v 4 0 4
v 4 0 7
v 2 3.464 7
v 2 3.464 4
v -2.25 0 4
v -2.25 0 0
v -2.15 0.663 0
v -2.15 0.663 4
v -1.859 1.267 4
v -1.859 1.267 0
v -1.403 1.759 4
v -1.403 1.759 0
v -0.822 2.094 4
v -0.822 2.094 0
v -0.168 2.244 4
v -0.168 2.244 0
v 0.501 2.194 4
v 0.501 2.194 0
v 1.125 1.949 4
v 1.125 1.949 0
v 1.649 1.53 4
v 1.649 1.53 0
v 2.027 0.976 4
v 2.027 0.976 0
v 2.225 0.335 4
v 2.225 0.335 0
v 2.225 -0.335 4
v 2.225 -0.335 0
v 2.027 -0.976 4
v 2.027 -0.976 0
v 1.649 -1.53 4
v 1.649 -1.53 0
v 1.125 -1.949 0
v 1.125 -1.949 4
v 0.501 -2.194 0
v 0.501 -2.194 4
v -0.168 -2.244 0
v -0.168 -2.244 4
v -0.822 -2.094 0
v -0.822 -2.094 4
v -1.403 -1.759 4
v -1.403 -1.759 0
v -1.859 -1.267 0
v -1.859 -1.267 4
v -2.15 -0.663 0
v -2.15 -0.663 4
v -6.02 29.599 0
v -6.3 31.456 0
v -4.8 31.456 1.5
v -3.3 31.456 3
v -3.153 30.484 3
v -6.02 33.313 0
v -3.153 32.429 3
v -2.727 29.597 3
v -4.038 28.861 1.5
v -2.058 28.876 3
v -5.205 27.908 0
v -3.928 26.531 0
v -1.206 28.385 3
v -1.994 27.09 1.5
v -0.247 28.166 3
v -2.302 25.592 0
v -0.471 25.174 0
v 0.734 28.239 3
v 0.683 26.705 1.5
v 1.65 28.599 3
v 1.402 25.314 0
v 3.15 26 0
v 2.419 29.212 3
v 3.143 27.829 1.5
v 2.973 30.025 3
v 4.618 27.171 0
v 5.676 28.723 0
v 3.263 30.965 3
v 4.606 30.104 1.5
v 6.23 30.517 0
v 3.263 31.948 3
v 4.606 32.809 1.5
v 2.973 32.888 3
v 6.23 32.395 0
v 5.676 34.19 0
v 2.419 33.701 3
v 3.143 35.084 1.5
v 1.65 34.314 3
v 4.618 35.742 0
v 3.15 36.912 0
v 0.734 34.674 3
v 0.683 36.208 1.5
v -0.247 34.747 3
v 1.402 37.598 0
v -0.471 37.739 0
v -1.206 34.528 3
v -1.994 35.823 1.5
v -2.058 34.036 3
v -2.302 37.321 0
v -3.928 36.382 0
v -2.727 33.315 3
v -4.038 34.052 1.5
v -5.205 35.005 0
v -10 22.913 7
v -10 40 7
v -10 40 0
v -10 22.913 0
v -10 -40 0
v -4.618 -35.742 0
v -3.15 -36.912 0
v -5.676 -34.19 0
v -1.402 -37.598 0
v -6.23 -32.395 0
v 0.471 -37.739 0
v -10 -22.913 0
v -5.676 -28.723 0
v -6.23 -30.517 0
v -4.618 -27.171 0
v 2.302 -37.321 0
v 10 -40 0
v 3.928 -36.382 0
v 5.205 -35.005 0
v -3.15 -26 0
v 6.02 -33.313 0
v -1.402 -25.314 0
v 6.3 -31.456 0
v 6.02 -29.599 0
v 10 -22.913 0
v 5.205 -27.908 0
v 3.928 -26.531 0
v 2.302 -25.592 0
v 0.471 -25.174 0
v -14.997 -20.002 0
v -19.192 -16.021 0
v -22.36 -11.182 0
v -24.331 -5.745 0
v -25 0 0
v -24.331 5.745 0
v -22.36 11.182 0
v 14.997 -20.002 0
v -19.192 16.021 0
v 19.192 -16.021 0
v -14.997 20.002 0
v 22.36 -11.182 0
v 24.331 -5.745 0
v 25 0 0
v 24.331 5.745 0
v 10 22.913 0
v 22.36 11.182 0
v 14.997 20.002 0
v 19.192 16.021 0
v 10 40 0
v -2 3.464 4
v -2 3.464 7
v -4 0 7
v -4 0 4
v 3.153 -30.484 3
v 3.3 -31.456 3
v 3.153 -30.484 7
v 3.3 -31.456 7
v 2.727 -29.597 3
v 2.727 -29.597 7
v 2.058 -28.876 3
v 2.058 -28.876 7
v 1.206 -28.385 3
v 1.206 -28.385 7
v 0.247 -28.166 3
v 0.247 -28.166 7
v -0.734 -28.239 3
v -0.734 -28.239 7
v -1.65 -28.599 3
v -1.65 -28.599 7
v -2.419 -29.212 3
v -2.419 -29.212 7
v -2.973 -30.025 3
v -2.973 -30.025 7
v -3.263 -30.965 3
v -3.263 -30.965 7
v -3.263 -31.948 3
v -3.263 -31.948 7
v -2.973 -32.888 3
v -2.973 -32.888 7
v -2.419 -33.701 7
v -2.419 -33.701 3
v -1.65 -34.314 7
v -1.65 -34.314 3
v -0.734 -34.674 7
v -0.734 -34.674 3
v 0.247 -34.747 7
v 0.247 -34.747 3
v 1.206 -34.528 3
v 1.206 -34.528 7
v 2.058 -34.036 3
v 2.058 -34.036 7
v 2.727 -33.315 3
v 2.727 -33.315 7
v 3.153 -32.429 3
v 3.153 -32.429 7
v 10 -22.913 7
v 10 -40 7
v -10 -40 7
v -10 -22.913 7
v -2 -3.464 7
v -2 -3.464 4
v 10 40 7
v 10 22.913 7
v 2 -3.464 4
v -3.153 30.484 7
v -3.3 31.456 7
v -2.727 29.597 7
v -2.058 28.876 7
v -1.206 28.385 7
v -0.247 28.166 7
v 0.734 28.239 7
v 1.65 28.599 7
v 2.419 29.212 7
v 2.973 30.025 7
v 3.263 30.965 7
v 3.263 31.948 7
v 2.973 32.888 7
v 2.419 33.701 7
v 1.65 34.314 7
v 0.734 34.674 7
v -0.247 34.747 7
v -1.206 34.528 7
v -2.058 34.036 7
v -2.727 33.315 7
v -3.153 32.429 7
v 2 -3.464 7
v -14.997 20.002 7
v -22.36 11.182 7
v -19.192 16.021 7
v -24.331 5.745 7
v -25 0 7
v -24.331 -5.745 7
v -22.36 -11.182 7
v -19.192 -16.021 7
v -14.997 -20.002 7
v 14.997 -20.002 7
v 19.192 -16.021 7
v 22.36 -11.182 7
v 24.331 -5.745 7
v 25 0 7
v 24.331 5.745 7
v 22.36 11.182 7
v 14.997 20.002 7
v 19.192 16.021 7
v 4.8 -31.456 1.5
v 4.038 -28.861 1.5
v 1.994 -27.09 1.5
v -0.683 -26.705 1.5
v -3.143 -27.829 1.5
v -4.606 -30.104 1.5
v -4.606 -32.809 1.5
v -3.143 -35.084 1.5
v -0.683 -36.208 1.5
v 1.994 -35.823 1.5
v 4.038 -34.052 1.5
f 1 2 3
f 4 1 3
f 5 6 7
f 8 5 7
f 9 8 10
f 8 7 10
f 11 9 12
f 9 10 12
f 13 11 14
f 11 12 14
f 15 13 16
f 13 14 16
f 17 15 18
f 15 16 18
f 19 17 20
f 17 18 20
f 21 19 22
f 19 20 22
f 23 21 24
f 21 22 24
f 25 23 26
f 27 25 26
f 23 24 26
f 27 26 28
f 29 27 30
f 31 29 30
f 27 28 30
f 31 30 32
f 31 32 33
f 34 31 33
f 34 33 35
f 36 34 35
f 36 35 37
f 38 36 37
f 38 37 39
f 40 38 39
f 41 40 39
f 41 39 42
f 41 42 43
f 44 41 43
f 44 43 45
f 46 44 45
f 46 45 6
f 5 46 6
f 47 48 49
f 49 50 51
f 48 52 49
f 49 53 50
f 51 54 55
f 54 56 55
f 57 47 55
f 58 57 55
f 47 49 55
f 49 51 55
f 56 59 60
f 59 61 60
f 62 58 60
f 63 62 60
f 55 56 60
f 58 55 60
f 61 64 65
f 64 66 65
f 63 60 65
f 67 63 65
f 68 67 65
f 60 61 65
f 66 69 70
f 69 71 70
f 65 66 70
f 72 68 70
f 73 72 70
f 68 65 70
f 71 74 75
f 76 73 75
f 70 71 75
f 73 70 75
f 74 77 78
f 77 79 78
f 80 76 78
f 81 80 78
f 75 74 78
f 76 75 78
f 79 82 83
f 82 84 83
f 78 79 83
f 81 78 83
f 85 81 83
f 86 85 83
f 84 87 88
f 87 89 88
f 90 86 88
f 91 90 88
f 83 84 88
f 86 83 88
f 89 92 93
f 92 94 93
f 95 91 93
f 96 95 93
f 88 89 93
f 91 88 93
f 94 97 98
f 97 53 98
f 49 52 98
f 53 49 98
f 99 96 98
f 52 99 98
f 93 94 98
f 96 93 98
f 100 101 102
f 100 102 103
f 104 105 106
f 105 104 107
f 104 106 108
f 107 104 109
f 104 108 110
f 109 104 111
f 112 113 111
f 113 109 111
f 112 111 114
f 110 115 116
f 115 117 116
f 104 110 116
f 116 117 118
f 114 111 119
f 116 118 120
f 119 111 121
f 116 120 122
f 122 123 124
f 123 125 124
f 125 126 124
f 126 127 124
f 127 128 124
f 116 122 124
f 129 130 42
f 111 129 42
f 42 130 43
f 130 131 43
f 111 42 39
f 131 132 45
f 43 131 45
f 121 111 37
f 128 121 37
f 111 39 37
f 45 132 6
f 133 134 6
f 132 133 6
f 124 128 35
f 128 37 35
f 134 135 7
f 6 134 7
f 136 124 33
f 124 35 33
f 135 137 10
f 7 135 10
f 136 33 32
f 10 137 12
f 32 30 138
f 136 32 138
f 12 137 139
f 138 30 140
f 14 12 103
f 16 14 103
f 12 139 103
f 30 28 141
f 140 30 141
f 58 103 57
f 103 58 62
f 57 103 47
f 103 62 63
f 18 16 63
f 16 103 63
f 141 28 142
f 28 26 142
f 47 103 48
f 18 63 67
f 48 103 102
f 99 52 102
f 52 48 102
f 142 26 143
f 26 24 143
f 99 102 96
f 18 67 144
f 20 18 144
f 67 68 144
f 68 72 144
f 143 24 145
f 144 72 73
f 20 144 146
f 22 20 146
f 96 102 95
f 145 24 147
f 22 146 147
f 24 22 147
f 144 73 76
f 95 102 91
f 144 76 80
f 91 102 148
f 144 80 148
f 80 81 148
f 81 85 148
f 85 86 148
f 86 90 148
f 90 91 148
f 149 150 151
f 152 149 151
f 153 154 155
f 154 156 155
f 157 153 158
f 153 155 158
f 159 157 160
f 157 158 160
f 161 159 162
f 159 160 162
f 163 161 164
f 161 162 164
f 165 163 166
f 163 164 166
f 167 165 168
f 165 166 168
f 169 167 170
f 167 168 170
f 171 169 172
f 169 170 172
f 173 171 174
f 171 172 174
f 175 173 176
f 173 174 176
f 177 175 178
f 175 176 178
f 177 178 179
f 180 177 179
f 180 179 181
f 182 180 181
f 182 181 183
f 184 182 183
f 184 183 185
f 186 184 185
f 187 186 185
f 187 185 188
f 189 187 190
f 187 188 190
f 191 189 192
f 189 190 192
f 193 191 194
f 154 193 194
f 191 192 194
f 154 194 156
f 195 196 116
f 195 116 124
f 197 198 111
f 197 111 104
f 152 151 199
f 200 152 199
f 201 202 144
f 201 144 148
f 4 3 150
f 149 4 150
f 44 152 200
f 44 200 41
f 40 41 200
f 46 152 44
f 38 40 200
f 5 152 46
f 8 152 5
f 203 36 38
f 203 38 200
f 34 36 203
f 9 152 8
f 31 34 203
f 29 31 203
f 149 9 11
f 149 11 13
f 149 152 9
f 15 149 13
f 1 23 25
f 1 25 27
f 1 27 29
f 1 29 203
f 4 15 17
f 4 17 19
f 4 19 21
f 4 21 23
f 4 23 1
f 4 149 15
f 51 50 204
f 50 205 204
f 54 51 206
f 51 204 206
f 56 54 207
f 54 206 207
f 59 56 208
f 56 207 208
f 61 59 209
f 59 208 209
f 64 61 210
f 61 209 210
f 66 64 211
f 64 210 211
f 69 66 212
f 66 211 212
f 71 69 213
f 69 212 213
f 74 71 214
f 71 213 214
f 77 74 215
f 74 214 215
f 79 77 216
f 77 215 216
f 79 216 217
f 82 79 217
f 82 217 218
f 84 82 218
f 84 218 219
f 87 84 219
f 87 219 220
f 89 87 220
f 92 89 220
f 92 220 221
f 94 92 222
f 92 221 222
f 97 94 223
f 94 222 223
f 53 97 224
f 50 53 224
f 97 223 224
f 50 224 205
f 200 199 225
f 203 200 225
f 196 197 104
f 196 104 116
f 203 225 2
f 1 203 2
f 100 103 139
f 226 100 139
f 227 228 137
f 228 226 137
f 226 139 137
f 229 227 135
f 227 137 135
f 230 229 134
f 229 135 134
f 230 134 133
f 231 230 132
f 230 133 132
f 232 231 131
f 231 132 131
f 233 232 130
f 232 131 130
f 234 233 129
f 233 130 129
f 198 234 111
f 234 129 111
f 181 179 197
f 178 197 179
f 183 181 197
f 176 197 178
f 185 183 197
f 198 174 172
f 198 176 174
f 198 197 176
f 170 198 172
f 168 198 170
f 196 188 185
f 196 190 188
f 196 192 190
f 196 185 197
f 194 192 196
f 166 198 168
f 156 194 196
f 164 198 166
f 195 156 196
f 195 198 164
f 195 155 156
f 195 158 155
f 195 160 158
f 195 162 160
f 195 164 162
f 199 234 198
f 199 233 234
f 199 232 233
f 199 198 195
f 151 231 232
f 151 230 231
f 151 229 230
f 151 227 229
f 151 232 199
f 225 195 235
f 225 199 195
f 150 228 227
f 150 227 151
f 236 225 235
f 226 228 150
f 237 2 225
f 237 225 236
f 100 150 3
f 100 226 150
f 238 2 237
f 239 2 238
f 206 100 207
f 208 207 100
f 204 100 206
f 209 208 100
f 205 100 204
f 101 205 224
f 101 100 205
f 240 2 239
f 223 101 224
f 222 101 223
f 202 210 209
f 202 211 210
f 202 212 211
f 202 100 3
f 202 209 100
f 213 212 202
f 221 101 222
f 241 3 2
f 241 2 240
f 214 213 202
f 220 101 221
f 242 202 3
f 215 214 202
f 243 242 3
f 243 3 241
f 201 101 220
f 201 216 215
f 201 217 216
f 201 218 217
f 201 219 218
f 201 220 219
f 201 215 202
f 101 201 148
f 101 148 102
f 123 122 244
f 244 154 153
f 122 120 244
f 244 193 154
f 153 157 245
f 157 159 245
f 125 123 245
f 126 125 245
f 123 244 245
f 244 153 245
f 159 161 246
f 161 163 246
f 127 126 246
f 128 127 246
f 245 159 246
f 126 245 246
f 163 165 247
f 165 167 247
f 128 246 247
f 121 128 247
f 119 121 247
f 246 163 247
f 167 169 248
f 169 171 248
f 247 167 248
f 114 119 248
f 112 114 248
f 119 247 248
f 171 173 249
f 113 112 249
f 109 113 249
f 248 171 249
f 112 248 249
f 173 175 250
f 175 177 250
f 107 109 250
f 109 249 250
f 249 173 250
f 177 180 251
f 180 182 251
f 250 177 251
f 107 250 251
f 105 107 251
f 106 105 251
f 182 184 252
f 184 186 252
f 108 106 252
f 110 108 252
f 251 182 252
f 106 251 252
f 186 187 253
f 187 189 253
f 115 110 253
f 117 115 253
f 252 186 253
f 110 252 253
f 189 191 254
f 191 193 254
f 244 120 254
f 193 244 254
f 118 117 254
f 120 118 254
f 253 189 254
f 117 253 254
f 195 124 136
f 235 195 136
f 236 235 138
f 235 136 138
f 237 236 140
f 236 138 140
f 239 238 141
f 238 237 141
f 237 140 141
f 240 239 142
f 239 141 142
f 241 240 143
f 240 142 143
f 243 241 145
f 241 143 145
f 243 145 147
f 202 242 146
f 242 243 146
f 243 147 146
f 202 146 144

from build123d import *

# Parameters (mm, degrees)
SKETCH1_R                                           = 25
BOSS_EXTRUDE1_DEPTH                                 = 7
BOSS_EXTRUDE2_DEPTH                                 = 7
CSK_FOR_M6_COUNTERSUNK_FLAT_HEAD_SCREW2_D           = 6.6
CSK_FOR_M6_COUNTERSUNK_FLAT_HEAD_SCREW2_CSINK_D     = 12.6
CSK_FOR_M6_COUNTERSUNK_FLAT_HEAD_SCREW2_CSINK_ANGLE = 90
CUT_EXTRUDE1_DEPTH                                  = 3
M4_CLEARANCE_HOLE1_D                                = 4.5
M4_CLEARANCE_HOLE1_DEPTH                            = 10
M4_CLEARANCE_HOLE1_TIP                              = 1.351936393
CIRPATTERN1_COUNT                                   = 2


with BuildPart() as part:
    # Sketch1 → Boss-Extrude1 (new body)
    with BuildSketch(Plane.XY):
        Circle(SKETCH1_R)
    extrude(amount=BOSS_EXTRUDE1_DEPTH)

    # Sketch2 → Boss-Extrude2 (add)
    with BuildSketch(Plane.XY.offset(7)):
        with BuildLine():
            Line((-10, -40), (10, -40))
            Line((10, -40), (10, -22.912878475))
            ThreePointArc((10, -22.912878475), (0, -25), (-10, -22.912878475))
            Line((-10, -22.912878475), (-10, -40))
        make_face()
    boss_extrude2 = extrude(amount=-BOSS_EXTRUDE2_DEPTH)

    # CSK for M6 Countersunk Flat Head Screw2 (through all)
    with Locations(Plane(origin=(0, 0, 0), x_dir=(-1, 0, 0), z_dir=(0, 0, -1))):
        with Locations((0, -31.456439237)):
            csk_for_m6_countersunk_flat_head_screw2 = CounterSinkHole(CSK_FOR_M6_COUNTERSUNK_FLAT_HEAD_SCREW2_D / 2, CSK_FOR_M6_COUNTERSUNK_FLAT_HEAD_SCREW2_CSINK_D / 2, counter_sink_angle=CSK_FOR_M6_COUNTERSUNK_FLAT_HEAD_SCREW2_CSINK_ANGLE)

    # Sketch10 → Cut-Extrude1 (cut)
    with BuildSketch(Plane.XY.offset(7)):
        Polygon((4, 0), (2, 3.464101615), (-2, 3.464101615), (-4, 0), (-2, -3.464101615), (2, -3.464101615), align=None)
    extrude(amount=-CUT_EXTRUDE1_DEPTH, mode=Mode.SUBTRACT)

    # M4 Clearance Hole1
    with Locations(Plane.XY.offset(4)):
        with Locations((0, 0)):
            Hole(M4_CLEARANCE_HOLE1_D / 2, depth=M4_CLEARANCE_HOLE1_DEPTH)
            with Locations((0, 0, -(M4_CLEARANCE_HOLE1_DEPTH + M4_CLEARANCE_HOLE1_TIP / 2))):  # 118° drill point
                Cone(0, M4_CLEARANCE_HOLE1_D / 2, M4_CLEARANCE_HOLE1_TIP, mode=Mode.SUBTRACT)

    # CirPattern1: Boss-Extrude2, CSK for M6 Countersunk Flat Head Screw2 ×2 about axis
    cirpattern1_axis = Axis((0, 0, 0), (0, 0, 1))
    for i in range(1, CIRPATTERN1_COUNT):
        add(boss_extrude2.rotate(cirpattern1_axis, i * 360 / CIRPATTERN1_COUNT))
        add(csk_for_m6_countersunk_flat_head_screw2.rotate(cirpattern1_axis, i * 360 / CIRPATTERN1_COUNT), mode=Mode.SUBTRACT)


solid = part.part
